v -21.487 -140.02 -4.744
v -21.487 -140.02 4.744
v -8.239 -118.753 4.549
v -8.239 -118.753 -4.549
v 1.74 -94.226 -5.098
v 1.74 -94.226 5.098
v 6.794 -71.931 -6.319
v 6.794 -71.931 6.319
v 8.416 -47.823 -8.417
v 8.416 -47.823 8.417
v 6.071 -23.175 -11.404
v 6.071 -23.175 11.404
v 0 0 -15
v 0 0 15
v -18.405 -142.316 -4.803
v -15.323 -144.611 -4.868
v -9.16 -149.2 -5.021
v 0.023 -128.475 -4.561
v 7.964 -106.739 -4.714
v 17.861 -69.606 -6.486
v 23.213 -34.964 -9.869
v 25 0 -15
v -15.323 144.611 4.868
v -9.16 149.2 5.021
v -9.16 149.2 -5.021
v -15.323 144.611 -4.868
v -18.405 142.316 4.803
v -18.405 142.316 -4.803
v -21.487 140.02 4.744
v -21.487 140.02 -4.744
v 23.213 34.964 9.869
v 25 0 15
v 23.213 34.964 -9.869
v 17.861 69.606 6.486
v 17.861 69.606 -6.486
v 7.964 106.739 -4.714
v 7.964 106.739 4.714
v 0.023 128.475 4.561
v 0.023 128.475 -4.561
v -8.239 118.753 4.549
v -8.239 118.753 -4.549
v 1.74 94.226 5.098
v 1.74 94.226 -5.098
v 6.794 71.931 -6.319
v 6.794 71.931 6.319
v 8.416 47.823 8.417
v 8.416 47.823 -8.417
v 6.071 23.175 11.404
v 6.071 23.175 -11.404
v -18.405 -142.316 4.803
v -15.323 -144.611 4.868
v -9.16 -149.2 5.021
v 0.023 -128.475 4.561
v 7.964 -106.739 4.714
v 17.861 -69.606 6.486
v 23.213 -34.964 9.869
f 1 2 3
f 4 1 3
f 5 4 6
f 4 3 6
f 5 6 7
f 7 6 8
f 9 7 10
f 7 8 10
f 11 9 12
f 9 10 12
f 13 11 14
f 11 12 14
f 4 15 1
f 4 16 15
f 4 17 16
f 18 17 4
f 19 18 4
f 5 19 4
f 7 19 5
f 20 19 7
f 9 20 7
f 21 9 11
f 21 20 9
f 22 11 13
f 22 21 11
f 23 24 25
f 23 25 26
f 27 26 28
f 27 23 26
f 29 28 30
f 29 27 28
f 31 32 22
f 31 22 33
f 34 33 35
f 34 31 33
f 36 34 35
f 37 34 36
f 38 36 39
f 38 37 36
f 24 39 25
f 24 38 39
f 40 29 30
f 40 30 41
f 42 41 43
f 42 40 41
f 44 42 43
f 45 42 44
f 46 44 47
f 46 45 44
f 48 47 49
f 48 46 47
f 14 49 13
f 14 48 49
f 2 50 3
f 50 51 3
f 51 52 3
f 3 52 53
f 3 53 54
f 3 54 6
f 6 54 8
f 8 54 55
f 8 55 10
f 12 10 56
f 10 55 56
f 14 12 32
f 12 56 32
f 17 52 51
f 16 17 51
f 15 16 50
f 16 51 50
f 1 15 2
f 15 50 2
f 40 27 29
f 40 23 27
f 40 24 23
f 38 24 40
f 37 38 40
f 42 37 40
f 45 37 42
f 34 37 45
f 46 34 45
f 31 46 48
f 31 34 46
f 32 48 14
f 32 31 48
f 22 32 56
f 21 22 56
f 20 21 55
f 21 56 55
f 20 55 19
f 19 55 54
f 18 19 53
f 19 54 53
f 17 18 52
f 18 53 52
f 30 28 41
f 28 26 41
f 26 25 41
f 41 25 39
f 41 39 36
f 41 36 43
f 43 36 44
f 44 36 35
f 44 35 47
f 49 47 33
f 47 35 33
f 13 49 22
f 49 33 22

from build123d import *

# Parameters (mm, degrees)
F1_DEPTH = 15
F3_DEPTH = 30


with BuildPart() as f1:
    # F0 (on Top) → F1 (new body)
    with BuildSketch(Plane.XY):
        with BuildLine():
            Line((0, 0), (25, 0))
            ThreePointArc((25, 0), (16.350977, 76.530518), (-9.159795, 149.200499))
            Line((-9.159795, 149.200499), (-21.486737, 140.02049))
            ThreePointArc((-21.486737, 140.02049), (6.680505, 72.684012), (0, 0))
        make_face()
    extrude(amount=F1_DEPTH)

    # F2 (on Right) → F3 (intersect, symmetric)
    with BuildSketch(Plane.YZ):
        with BuildLine():
            ThreePointArc((149.200499, 5.021363), (74.342296, 6.153758), (0, 15))
            Line((0, 15), (0, 0))
            Line((0, 0), (149.200499, 0))
            Line((149.200499, 0), (149.200499, 5.021363))
        make_face()
    extrude(amount=F3_DEPTH, both=True, mode=Mode.INTERSECT)

    # F4: F1 across plane


with BuildPart() as f1_1:
    add(f1.part)
    add(f1.part.mirror(Plane.XZ))

    # F5: F1 across plane


with BuildPart() as f1_2:
    add(f1_1.part)
    add(f1_1.part.mirror(Plane.XY))


solid = f1_2.part
